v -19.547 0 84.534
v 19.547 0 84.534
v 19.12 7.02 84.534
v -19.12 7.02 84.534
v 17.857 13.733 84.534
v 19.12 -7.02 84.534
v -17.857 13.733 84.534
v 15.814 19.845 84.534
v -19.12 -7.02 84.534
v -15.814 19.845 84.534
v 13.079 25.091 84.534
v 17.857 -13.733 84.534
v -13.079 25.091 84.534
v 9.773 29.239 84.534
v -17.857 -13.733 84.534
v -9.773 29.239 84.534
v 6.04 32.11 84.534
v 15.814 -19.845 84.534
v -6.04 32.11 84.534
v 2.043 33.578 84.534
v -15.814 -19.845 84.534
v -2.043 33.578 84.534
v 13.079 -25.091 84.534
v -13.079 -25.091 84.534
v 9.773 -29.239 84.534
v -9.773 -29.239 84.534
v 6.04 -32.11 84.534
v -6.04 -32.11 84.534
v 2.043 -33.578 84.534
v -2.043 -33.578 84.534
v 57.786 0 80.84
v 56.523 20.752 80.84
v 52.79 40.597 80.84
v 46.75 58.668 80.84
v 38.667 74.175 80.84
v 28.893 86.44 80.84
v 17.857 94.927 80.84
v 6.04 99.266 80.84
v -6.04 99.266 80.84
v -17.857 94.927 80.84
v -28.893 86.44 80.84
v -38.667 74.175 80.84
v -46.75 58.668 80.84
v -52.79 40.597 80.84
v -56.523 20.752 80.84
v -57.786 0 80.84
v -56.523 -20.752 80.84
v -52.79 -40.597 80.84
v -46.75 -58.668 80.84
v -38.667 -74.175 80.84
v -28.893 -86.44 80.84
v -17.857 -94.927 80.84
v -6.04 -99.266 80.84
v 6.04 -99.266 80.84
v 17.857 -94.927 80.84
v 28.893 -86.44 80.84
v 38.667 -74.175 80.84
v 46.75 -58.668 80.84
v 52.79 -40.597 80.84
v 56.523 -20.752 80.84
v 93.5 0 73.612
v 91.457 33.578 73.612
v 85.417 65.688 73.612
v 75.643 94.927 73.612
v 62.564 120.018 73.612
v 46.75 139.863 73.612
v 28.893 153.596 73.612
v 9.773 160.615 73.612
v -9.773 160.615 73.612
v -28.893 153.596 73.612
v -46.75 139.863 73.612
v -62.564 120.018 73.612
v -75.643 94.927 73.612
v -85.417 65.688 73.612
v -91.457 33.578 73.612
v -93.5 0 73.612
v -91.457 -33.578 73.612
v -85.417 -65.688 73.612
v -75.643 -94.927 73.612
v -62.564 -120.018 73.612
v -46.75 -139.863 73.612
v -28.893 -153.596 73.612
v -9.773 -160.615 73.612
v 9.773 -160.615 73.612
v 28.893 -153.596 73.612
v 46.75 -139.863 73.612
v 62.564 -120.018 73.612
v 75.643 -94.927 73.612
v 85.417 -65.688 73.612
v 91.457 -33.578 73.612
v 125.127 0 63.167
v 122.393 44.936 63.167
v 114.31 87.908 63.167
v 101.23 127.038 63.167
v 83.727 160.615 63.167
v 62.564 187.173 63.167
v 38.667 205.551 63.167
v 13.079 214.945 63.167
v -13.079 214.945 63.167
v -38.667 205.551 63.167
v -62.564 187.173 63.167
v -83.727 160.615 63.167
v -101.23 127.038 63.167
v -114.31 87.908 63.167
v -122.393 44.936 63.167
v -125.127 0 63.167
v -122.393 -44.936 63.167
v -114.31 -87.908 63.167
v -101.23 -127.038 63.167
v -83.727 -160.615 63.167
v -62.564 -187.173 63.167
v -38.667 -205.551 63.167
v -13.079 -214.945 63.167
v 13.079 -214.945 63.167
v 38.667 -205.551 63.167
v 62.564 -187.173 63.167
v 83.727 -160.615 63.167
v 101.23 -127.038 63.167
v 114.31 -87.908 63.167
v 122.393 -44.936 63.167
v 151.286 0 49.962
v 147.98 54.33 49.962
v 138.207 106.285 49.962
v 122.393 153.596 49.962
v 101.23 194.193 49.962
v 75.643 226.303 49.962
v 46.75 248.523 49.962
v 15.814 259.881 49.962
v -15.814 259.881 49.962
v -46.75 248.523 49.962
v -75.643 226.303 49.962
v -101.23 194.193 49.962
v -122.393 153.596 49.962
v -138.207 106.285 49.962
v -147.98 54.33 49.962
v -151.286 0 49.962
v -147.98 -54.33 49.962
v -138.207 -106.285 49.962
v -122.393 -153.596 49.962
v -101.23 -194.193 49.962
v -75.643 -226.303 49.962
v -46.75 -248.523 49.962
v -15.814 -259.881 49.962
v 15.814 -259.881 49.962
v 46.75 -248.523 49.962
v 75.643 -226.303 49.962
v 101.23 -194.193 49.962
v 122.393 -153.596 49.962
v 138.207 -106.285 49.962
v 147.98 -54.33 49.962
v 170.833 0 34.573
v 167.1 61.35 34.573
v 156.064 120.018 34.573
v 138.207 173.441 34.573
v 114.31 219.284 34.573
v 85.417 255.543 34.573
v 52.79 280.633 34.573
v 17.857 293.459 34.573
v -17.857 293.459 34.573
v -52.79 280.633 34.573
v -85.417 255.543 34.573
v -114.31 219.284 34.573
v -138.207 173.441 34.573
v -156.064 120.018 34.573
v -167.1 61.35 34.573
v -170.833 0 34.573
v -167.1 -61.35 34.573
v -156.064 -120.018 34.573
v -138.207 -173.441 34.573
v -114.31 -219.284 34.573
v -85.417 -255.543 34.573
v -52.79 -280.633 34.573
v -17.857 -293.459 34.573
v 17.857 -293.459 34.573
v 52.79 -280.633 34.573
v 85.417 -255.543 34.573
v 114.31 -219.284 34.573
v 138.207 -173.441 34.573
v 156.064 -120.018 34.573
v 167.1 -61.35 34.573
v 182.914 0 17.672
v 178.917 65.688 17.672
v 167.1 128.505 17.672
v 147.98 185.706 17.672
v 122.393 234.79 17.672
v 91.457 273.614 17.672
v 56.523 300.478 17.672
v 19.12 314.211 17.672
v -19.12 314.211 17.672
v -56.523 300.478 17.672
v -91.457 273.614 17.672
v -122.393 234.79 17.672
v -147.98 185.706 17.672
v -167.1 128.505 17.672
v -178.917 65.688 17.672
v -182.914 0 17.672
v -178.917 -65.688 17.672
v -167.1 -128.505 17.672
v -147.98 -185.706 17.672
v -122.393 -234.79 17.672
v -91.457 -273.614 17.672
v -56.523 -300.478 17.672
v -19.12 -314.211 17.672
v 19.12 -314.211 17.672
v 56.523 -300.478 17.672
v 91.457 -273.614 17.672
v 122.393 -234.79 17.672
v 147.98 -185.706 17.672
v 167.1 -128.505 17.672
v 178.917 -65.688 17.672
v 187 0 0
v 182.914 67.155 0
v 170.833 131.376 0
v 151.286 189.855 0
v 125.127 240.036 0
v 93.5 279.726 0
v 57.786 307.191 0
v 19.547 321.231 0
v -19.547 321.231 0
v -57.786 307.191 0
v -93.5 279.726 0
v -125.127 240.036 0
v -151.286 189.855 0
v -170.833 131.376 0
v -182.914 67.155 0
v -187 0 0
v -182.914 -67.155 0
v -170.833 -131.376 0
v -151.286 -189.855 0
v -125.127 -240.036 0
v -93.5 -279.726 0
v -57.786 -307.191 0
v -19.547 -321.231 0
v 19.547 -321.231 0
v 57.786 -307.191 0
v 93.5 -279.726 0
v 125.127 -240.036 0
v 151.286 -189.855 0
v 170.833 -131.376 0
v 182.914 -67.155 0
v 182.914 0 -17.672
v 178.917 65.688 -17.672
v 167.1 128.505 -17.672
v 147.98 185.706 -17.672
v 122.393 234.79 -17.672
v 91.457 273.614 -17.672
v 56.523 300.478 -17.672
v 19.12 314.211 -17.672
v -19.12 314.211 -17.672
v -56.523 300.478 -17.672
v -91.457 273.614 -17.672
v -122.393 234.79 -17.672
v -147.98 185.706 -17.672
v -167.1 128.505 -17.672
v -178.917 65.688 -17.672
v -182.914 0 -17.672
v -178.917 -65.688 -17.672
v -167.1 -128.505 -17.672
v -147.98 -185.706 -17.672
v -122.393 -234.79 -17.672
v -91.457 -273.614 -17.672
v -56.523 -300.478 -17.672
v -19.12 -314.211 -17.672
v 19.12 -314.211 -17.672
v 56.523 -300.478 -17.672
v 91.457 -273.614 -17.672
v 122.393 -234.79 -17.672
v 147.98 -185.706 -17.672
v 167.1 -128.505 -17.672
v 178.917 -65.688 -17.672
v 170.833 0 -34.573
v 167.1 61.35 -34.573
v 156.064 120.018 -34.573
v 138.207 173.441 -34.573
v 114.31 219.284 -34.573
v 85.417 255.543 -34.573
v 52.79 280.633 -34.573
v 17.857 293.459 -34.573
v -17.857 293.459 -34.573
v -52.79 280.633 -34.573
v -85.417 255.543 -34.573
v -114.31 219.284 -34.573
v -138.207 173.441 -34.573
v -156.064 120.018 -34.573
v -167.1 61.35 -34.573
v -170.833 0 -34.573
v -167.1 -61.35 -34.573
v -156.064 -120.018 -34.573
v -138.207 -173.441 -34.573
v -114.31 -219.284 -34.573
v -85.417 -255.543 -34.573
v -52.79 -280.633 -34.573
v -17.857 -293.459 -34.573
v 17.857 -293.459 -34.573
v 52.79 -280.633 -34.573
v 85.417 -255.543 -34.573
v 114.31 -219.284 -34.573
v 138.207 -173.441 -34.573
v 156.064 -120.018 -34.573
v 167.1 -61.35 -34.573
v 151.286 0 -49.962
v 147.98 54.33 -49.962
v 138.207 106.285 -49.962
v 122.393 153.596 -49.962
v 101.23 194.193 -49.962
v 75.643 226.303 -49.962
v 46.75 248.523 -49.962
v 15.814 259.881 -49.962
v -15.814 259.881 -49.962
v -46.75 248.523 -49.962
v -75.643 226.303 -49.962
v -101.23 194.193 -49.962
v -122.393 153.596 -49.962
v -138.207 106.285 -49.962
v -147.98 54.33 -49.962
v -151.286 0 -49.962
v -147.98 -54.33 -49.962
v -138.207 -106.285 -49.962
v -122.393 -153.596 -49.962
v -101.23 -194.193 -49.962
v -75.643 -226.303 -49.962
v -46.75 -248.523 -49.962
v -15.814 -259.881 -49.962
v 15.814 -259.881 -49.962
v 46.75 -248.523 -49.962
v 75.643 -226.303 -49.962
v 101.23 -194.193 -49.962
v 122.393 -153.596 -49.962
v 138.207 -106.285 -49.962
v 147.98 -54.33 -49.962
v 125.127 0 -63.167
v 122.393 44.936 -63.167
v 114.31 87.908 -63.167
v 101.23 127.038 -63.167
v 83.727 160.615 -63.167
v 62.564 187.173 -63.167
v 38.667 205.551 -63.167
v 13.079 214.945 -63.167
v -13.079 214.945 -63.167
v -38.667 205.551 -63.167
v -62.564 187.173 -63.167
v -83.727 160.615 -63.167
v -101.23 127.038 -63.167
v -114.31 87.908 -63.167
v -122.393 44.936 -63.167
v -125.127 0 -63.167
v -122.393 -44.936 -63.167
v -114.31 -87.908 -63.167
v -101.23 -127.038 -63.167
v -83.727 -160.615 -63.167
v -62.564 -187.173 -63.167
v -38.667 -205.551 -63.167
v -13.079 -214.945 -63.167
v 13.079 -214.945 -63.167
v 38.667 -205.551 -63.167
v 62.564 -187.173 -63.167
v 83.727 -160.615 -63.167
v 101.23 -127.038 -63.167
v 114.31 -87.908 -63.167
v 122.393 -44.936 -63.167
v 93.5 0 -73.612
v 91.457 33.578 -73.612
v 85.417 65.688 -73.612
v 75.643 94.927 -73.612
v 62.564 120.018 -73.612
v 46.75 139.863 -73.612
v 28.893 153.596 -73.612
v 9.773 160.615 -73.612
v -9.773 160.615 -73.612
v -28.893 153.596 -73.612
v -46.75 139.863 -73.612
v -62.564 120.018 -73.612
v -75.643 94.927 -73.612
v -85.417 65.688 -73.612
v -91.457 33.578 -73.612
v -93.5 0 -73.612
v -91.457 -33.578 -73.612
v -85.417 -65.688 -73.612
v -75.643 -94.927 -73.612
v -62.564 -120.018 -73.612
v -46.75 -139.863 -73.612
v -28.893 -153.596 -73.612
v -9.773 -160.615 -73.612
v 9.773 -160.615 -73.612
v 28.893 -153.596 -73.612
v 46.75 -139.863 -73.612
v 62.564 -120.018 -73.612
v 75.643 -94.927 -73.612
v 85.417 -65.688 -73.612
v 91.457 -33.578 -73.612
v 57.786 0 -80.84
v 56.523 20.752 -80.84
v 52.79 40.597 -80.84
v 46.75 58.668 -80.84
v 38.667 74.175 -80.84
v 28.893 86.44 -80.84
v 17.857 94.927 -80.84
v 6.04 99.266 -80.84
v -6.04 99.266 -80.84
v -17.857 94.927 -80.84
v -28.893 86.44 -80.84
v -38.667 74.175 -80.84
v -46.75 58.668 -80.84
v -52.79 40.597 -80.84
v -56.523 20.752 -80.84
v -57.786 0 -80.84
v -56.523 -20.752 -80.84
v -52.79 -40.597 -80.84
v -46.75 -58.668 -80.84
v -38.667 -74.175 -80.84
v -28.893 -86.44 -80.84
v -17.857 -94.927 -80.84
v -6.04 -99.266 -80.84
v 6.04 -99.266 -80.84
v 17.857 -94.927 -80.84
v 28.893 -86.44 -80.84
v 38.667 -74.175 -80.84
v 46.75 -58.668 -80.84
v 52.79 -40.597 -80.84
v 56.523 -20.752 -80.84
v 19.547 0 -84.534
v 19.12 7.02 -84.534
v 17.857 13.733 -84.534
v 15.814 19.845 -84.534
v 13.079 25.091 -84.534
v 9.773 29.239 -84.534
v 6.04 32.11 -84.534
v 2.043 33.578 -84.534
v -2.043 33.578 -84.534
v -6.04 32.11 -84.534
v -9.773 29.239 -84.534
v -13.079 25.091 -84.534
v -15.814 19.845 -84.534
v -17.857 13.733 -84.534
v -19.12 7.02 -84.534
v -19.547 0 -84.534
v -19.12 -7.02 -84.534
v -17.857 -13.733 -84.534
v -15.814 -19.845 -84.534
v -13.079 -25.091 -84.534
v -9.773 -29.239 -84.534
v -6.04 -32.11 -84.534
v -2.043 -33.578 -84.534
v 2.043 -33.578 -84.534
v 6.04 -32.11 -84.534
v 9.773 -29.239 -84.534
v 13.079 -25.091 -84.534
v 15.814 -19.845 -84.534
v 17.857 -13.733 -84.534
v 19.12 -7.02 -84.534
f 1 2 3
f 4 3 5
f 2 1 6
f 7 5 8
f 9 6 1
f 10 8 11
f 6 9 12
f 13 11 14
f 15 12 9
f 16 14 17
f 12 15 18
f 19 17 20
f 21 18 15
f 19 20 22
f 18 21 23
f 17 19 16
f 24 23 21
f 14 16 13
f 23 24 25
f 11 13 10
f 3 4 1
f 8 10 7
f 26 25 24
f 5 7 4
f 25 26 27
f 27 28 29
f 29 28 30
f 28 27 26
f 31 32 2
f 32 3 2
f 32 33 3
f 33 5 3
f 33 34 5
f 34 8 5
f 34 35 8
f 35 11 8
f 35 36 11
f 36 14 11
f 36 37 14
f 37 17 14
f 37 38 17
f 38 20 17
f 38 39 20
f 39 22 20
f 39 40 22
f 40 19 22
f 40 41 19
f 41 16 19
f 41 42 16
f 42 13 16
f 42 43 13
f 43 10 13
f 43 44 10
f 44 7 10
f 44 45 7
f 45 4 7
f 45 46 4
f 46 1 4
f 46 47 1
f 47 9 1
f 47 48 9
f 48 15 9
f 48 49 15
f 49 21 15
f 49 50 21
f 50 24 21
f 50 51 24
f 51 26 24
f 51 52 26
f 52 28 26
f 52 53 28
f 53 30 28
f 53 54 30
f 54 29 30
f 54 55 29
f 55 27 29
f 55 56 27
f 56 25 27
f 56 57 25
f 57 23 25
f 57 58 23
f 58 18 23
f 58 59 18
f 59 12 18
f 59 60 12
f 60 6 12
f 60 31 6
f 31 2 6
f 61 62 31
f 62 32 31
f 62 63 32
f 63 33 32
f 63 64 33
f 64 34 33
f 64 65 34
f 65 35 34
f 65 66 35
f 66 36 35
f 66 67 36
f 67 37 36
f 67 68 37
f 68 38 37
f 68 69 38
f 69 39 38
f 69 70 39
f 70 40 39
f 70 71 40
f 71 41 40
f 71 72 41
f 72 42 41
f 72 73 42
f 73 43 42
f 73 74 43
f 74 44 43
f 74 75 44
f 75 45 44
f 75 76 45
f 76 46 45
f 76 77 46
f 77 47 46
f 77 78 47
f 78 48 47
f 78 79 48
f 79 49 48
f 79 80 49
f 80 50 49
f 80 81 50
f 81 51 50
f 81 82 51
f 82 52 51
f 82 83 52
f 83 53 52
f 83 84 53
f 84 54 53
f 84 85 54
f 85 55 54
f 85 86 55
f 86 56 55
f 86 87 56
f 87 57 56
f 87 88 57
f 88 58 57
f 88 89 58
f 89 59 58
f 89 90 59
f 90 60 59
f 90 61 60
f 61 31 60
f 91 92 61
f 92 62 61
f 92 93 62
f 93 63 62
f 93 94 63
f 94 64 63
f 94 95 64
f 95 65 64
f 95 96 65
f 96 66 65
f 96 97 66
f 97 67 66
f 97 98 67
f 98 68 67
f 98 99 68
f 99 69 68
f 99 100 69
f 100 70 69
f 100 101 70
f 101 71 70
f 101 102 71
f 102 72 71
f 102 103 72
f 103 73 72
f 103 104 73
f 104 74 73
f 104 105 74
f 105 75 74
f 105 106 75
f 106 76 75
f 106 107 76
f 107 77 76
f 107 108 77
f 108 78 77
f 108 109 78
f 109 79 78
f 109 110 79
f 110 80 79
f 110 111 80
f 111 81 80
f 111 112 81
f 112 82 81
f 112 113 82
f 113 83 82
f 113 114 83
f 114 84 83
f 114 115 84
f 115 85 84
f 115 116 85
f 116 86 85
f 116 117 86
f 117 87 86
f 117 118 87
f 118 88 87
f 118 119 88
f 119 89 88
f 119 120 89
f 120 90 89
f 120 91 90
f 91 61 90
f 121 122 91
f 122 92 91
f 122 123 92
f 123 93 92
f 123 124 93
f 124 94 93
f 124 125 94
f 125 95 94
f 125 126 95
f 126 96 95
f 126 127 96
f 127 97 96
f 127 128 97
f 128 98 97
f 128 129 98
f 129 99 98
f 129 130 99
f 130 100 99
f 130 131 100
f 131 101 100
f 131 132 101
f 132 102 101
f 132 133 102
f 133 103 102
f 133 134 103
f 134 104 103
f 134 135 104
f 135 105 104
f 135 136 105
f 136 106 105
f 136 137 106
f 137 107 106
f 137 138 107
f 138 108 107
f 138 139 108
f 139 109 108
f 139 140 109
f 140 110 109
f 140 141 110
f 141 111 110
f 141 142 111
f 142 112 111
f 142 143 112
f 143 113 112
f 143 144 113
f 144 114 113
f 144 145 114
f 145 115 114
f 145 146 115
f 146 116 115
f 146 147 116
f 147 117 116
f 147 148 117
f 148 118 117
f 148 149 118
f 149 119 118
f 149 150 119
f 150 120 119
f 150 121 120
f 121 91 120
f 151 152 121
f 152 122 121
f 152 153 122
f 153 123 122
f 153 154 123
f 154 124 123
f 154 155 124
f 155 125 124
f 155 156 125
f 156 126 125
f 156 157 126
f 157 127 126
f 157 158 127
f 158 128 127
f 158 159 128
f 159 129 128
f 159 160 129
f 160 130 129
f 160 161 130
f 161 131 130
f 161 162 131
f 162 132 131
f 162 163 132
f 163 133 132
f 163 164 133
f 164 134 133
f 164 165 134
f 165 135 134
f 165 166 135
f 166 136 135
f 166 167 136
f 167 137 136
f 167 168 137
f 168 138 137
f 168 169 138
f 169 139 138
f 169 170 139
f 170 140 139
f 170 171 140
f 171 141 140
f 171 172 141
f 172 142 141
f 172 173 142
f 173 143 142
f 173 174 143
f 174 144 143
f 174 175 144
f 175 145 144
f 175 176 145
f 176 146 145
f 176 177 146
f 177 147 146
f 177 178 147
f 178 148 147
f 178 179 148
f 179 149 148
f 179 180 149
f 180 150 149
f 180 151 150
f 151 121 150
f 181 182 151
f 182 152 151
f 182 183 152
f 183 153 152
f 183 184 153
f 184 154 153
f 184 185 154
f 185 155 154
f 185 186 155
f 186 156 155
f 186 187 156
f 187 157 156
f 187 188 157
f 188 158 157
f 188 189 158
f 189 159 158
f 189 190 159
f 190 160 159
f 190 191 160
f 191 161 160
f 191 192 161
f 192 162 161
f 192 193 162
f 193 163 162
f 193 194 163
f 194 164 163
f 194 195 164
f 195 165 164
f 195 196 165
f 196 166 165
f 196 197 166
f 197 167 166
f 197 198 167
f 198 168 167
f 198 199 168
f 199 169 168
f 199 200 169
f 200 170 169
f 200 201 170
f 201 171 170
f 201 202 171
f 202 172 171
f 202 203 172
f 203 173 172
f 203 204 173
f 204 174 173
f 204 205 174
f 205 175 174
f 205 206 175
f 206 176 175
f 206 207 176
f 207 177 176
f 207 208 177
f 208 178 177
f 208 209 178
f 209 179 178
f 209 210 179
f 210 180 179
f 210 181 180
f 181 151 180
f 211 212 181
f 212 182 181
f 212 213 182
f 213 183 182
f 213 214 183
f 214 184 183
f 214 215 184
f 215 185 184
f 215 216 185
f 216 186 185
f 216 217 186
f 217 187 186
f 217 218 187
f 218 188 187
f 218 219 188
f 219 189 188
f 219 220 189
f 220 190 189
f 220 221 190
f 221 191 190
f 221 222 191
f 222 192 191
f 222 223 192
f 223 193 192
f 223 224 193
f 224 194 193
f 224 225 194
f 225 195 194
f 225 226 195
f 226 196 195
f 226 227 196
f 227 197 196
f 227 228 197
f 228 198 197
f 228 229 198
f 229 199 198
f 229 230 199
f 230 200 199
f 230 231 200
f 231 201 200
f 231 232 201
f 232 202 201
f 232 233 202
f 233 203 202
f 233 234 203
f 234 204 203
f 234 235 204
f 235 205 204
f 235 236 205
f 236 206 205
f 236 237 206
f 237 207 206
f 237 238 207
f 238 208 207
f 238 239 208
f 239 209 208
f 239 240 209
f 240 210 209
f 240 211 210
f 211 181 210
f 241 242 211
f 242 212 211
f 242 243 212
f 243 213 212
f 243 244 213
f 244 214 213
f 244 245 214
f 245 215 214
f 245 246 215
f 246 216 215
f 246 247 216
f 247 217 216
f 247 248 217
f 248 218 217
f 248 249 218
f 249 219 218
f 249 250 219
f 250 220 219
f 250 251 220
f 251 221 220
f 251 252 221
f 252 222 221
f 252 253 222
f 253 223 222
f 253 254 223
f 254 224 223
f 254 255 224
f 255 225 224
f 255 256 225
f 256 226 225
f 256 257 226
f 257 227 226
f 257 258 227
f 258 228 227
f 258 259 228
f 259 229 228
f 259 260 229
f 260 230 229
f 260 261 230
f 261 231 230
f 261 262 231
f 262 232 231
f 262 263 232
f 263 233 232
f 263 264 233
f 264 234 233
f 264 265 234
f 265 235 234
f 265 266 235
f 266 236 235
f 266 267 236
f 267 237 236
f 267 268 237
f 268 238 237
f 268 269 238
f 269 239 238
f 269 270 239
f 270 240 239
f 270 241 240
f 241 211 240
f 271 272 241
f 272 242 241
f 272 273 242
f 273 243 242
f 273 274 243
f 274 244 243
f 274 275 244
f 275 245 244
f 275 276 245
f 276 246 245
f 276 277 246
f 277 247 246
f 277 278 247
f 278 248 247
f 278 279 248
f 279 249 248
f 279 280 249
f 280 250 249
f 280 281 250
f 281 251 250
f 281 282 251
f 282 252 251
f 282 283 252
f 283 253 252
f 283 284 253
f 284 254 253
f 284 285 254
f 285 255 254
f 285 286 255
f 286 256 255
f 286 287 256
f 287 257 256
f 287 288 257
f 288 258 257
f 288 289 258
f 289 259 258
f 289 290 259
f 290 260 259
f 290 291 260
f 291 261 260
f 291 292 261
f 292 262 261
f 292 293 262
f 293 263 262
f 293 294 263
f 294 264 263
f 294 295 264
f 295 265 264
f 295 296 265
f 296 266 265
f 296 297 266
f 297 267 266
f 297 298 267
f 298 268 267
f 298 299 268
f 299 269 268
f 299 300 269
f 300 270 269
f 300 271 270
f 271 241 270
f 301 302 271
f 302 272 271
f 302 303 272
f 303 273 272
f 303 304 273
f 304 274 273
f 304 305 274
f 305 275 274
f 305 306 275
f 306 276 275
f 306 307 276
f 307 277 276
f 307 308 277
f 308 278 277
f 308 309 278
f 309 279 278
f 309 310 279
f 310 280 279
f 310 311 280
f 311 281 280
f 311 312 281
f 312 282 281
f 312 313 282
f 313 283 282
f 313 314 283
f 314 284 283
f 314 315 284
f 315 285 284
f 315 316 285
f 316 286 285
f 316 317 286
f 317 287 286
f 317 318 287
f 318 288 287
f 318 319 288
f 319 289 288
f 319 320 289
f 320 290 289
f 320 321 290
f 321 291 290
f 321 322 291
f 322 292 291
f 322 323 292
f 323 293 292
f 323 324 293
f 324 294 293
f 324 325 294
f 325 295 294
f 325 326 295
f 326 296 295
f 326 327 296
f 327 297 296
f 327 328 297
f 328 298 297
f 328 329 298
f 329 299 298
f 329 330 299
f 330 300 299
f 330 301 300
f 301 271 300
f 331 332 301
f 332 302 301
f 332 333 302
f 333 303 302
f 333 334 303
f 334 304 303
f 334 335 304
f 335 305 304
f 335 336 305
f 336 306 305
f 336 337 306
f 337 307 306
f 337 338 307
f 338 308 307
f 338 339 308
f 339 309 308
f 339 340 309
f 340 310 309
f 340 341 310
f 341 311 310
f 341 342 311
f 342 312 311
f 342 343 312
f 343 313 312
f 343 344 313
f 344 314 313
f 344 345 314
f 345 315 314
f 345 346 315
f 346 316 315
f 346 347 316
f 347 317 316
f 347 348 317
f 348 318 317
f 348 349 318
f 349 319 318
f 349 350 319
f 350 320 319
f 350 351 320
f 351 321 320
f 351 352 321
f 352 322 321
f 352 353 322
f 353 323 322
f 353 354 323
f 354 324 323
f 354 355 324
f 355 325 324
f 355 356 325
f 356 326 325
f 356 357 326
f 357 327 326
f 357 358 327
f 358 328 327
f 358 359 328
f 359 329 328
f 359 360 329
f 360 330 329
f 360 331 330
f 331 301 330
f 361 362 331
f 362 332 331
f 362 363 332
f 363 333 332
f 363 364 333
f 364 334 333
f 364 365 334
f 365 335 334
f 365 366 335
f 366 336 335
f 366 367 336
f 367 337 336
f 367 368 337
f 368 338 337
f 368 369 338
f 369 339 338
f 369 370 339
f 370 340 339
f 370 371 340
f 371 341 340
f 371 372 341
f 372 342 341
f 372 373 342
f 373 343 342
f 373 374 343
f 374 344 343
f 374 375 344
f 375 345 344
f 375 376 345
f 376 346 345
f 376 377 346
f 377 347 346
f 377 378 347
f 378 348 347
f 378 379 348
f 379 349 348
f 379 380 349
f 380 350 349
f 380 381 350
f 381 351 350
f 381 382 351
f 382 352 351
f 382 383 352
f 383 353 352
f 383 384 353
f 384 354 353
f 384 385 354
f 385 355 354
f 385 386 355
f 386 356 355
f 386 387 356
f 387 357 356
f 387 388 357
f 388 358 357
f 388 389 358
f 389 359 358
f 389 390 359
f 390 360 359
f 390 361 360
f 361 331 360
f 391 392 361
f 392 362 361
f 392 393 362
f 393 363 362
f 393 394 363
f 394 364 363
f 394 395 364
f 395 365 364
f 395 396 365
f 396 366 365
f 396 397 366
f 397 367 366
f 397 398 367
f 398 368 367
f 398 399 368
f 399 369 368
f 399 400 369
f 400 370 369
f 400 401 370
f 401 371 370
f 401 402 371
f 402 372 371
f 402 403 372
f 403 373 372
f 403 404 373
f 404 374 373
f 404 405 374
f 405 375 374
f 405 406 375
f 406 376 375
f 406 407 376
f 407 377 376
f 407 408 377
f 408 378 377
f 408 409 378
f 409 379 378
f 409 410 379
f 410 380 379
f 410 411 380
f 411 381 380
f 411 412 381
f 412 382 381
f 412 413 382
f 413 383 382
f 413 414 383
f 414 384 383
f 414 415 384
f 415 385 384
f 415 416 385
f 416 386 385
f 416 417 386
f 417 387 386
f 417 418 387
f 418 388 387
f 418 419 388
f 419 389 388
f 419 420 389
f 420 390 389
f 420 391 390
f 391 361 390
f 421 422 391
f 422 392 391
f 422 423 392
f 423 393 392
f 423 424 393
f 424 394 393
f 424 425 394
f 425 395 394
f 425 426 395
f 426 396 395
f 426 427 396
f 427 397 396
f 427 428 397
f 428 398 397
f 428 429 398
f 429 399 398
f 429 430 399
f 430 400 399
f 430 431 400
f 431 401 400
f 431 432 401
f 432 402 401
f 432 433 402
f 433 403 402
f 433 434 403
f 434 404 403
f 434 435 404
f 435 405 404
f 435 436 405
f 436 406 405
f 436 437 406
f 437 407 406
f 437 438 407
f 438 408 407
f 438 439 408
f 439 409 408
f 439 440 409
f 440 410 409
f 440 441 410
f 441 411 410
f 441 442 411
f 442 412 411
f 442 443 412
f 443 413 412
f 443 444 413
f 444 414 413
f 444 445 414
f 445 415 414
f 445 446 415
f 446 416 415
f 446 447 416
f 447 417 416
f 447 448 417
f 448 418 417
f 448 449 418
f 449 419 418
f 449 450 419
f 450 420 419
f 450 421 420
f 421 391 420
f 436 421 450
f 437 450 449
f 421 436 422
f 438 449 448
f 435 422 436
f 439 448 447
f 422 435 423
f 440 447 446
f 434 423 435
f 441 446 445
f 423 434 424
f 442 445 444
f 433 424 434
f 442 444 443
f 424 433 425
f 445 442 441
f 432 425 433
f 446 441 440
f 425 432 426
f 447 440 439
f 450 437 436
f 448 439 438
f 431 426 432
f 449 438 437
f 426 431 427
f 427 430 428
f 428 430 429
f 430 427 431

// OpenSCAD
// Generated by SolidPython 1.0.1 on 2020-07-29 00:46:50


scale(v = [11, 19, 5]) {
	sphere(r = 17);
}
/***********************************************
*********      SolidPython code:      **********
************************************************
 
# import packages: SolidPython
from solid import *
from solid.utils import *
from itertools import chain, combinations, permutations


class Resize:

    def __init__(self, scad_file):
        self.scad_file = scad_file
        #self.scad_file = import_scad(scad_file)
        # cone/cylinder param:
        self.r1 = 0
        self.r2 = 0
        self.h = 0
        # rectangular prism param:
        self.w = 0
        self.l = 0
        # ellipse param:
        self.r = 0

    # import OpenScad code (file name corresponds to shape)


    # classify shape + parameters
    def assign(self, param1, param2, param3):
        if self.scad_file == 'cone.scad':
            self.r1 = param1
            self.r2 = param2
            self.h = param3
        elif self.scad_file == 'cylinder.scad':
            self.r1 = param1
            self.r2 = param2
            self.h = param3
        elif self.scad_file == 'rectangularPrism.scad':
            self.h = param1
            self.l = param2
            self.w = param3
        else:
            self.r = param1
            self.h = param2

    # resize parameters
    def iterate(self):
        x = range(3, 20, 2)
        i = 1
        if self.scad_file == 'cone.scad':
            tempList = list(permutations(x, 2))
            for temp in tempList:
                param1 = temp[0]
                param2 = temp[1]
                filepath = 'produced_scad_files/' + 'cone' + str(param1) + '_' + str(param2) + '_' + '.scad'
                scad_render_to_file(cylinder(h=param1, r1=param2, r2=0), filepath)

        elif self.scad_file == 'cylinder.scad':
            tempList = list(permutations(x, 3))
            for temp in tempList:
                param1 = temp[0]
                param2 = temp[1]
                filepath = 'produced_scad_files/' + 'cylinder' + str(param1) + '_' + str(param2) + '_' + '.scad'
                scad_render_to_file(cylinder(h=param1, r1=param2, r2=param2), filepath)

        elif self.scad_file == 'rectangularPrism.scad':
            tempList = list(permutations(x, 3))
            for temp in tempList:
                param1 = temp[0]
                param2 = temp[1]
                param3 = temp[2]
                filepath = 'produced_scad_files/' + 'rectangularPrism' + str(param1) + '_' + str(param2) + '_' + str(
                    param3) + '.scad'
                scad_render_to_file(cube(size=(param1, param2, param3)), filepath)

        elif self.scad_file == 'ellipse.scad':
            tempList = list(permutations(x, 4))
            for temp in tempList:
                param1 = temp[0]
                param2 = temp[1]
                param3 = temp[2]
                param4 = temp[3]
                filepath = 'produced_scad_files/' + 'ellipse' + str(param1) + '_' + str(param2) + '_' + str(param3) + '_' + str(param4) + '.scad'
                scad_render_to_file(scale([param1, param2, param3])(sphere(r=param4)), filepath)

    def render_to_scadfile(self):
        scad_render_to_file(scad, 'example.scad') 
 
************************************************/
